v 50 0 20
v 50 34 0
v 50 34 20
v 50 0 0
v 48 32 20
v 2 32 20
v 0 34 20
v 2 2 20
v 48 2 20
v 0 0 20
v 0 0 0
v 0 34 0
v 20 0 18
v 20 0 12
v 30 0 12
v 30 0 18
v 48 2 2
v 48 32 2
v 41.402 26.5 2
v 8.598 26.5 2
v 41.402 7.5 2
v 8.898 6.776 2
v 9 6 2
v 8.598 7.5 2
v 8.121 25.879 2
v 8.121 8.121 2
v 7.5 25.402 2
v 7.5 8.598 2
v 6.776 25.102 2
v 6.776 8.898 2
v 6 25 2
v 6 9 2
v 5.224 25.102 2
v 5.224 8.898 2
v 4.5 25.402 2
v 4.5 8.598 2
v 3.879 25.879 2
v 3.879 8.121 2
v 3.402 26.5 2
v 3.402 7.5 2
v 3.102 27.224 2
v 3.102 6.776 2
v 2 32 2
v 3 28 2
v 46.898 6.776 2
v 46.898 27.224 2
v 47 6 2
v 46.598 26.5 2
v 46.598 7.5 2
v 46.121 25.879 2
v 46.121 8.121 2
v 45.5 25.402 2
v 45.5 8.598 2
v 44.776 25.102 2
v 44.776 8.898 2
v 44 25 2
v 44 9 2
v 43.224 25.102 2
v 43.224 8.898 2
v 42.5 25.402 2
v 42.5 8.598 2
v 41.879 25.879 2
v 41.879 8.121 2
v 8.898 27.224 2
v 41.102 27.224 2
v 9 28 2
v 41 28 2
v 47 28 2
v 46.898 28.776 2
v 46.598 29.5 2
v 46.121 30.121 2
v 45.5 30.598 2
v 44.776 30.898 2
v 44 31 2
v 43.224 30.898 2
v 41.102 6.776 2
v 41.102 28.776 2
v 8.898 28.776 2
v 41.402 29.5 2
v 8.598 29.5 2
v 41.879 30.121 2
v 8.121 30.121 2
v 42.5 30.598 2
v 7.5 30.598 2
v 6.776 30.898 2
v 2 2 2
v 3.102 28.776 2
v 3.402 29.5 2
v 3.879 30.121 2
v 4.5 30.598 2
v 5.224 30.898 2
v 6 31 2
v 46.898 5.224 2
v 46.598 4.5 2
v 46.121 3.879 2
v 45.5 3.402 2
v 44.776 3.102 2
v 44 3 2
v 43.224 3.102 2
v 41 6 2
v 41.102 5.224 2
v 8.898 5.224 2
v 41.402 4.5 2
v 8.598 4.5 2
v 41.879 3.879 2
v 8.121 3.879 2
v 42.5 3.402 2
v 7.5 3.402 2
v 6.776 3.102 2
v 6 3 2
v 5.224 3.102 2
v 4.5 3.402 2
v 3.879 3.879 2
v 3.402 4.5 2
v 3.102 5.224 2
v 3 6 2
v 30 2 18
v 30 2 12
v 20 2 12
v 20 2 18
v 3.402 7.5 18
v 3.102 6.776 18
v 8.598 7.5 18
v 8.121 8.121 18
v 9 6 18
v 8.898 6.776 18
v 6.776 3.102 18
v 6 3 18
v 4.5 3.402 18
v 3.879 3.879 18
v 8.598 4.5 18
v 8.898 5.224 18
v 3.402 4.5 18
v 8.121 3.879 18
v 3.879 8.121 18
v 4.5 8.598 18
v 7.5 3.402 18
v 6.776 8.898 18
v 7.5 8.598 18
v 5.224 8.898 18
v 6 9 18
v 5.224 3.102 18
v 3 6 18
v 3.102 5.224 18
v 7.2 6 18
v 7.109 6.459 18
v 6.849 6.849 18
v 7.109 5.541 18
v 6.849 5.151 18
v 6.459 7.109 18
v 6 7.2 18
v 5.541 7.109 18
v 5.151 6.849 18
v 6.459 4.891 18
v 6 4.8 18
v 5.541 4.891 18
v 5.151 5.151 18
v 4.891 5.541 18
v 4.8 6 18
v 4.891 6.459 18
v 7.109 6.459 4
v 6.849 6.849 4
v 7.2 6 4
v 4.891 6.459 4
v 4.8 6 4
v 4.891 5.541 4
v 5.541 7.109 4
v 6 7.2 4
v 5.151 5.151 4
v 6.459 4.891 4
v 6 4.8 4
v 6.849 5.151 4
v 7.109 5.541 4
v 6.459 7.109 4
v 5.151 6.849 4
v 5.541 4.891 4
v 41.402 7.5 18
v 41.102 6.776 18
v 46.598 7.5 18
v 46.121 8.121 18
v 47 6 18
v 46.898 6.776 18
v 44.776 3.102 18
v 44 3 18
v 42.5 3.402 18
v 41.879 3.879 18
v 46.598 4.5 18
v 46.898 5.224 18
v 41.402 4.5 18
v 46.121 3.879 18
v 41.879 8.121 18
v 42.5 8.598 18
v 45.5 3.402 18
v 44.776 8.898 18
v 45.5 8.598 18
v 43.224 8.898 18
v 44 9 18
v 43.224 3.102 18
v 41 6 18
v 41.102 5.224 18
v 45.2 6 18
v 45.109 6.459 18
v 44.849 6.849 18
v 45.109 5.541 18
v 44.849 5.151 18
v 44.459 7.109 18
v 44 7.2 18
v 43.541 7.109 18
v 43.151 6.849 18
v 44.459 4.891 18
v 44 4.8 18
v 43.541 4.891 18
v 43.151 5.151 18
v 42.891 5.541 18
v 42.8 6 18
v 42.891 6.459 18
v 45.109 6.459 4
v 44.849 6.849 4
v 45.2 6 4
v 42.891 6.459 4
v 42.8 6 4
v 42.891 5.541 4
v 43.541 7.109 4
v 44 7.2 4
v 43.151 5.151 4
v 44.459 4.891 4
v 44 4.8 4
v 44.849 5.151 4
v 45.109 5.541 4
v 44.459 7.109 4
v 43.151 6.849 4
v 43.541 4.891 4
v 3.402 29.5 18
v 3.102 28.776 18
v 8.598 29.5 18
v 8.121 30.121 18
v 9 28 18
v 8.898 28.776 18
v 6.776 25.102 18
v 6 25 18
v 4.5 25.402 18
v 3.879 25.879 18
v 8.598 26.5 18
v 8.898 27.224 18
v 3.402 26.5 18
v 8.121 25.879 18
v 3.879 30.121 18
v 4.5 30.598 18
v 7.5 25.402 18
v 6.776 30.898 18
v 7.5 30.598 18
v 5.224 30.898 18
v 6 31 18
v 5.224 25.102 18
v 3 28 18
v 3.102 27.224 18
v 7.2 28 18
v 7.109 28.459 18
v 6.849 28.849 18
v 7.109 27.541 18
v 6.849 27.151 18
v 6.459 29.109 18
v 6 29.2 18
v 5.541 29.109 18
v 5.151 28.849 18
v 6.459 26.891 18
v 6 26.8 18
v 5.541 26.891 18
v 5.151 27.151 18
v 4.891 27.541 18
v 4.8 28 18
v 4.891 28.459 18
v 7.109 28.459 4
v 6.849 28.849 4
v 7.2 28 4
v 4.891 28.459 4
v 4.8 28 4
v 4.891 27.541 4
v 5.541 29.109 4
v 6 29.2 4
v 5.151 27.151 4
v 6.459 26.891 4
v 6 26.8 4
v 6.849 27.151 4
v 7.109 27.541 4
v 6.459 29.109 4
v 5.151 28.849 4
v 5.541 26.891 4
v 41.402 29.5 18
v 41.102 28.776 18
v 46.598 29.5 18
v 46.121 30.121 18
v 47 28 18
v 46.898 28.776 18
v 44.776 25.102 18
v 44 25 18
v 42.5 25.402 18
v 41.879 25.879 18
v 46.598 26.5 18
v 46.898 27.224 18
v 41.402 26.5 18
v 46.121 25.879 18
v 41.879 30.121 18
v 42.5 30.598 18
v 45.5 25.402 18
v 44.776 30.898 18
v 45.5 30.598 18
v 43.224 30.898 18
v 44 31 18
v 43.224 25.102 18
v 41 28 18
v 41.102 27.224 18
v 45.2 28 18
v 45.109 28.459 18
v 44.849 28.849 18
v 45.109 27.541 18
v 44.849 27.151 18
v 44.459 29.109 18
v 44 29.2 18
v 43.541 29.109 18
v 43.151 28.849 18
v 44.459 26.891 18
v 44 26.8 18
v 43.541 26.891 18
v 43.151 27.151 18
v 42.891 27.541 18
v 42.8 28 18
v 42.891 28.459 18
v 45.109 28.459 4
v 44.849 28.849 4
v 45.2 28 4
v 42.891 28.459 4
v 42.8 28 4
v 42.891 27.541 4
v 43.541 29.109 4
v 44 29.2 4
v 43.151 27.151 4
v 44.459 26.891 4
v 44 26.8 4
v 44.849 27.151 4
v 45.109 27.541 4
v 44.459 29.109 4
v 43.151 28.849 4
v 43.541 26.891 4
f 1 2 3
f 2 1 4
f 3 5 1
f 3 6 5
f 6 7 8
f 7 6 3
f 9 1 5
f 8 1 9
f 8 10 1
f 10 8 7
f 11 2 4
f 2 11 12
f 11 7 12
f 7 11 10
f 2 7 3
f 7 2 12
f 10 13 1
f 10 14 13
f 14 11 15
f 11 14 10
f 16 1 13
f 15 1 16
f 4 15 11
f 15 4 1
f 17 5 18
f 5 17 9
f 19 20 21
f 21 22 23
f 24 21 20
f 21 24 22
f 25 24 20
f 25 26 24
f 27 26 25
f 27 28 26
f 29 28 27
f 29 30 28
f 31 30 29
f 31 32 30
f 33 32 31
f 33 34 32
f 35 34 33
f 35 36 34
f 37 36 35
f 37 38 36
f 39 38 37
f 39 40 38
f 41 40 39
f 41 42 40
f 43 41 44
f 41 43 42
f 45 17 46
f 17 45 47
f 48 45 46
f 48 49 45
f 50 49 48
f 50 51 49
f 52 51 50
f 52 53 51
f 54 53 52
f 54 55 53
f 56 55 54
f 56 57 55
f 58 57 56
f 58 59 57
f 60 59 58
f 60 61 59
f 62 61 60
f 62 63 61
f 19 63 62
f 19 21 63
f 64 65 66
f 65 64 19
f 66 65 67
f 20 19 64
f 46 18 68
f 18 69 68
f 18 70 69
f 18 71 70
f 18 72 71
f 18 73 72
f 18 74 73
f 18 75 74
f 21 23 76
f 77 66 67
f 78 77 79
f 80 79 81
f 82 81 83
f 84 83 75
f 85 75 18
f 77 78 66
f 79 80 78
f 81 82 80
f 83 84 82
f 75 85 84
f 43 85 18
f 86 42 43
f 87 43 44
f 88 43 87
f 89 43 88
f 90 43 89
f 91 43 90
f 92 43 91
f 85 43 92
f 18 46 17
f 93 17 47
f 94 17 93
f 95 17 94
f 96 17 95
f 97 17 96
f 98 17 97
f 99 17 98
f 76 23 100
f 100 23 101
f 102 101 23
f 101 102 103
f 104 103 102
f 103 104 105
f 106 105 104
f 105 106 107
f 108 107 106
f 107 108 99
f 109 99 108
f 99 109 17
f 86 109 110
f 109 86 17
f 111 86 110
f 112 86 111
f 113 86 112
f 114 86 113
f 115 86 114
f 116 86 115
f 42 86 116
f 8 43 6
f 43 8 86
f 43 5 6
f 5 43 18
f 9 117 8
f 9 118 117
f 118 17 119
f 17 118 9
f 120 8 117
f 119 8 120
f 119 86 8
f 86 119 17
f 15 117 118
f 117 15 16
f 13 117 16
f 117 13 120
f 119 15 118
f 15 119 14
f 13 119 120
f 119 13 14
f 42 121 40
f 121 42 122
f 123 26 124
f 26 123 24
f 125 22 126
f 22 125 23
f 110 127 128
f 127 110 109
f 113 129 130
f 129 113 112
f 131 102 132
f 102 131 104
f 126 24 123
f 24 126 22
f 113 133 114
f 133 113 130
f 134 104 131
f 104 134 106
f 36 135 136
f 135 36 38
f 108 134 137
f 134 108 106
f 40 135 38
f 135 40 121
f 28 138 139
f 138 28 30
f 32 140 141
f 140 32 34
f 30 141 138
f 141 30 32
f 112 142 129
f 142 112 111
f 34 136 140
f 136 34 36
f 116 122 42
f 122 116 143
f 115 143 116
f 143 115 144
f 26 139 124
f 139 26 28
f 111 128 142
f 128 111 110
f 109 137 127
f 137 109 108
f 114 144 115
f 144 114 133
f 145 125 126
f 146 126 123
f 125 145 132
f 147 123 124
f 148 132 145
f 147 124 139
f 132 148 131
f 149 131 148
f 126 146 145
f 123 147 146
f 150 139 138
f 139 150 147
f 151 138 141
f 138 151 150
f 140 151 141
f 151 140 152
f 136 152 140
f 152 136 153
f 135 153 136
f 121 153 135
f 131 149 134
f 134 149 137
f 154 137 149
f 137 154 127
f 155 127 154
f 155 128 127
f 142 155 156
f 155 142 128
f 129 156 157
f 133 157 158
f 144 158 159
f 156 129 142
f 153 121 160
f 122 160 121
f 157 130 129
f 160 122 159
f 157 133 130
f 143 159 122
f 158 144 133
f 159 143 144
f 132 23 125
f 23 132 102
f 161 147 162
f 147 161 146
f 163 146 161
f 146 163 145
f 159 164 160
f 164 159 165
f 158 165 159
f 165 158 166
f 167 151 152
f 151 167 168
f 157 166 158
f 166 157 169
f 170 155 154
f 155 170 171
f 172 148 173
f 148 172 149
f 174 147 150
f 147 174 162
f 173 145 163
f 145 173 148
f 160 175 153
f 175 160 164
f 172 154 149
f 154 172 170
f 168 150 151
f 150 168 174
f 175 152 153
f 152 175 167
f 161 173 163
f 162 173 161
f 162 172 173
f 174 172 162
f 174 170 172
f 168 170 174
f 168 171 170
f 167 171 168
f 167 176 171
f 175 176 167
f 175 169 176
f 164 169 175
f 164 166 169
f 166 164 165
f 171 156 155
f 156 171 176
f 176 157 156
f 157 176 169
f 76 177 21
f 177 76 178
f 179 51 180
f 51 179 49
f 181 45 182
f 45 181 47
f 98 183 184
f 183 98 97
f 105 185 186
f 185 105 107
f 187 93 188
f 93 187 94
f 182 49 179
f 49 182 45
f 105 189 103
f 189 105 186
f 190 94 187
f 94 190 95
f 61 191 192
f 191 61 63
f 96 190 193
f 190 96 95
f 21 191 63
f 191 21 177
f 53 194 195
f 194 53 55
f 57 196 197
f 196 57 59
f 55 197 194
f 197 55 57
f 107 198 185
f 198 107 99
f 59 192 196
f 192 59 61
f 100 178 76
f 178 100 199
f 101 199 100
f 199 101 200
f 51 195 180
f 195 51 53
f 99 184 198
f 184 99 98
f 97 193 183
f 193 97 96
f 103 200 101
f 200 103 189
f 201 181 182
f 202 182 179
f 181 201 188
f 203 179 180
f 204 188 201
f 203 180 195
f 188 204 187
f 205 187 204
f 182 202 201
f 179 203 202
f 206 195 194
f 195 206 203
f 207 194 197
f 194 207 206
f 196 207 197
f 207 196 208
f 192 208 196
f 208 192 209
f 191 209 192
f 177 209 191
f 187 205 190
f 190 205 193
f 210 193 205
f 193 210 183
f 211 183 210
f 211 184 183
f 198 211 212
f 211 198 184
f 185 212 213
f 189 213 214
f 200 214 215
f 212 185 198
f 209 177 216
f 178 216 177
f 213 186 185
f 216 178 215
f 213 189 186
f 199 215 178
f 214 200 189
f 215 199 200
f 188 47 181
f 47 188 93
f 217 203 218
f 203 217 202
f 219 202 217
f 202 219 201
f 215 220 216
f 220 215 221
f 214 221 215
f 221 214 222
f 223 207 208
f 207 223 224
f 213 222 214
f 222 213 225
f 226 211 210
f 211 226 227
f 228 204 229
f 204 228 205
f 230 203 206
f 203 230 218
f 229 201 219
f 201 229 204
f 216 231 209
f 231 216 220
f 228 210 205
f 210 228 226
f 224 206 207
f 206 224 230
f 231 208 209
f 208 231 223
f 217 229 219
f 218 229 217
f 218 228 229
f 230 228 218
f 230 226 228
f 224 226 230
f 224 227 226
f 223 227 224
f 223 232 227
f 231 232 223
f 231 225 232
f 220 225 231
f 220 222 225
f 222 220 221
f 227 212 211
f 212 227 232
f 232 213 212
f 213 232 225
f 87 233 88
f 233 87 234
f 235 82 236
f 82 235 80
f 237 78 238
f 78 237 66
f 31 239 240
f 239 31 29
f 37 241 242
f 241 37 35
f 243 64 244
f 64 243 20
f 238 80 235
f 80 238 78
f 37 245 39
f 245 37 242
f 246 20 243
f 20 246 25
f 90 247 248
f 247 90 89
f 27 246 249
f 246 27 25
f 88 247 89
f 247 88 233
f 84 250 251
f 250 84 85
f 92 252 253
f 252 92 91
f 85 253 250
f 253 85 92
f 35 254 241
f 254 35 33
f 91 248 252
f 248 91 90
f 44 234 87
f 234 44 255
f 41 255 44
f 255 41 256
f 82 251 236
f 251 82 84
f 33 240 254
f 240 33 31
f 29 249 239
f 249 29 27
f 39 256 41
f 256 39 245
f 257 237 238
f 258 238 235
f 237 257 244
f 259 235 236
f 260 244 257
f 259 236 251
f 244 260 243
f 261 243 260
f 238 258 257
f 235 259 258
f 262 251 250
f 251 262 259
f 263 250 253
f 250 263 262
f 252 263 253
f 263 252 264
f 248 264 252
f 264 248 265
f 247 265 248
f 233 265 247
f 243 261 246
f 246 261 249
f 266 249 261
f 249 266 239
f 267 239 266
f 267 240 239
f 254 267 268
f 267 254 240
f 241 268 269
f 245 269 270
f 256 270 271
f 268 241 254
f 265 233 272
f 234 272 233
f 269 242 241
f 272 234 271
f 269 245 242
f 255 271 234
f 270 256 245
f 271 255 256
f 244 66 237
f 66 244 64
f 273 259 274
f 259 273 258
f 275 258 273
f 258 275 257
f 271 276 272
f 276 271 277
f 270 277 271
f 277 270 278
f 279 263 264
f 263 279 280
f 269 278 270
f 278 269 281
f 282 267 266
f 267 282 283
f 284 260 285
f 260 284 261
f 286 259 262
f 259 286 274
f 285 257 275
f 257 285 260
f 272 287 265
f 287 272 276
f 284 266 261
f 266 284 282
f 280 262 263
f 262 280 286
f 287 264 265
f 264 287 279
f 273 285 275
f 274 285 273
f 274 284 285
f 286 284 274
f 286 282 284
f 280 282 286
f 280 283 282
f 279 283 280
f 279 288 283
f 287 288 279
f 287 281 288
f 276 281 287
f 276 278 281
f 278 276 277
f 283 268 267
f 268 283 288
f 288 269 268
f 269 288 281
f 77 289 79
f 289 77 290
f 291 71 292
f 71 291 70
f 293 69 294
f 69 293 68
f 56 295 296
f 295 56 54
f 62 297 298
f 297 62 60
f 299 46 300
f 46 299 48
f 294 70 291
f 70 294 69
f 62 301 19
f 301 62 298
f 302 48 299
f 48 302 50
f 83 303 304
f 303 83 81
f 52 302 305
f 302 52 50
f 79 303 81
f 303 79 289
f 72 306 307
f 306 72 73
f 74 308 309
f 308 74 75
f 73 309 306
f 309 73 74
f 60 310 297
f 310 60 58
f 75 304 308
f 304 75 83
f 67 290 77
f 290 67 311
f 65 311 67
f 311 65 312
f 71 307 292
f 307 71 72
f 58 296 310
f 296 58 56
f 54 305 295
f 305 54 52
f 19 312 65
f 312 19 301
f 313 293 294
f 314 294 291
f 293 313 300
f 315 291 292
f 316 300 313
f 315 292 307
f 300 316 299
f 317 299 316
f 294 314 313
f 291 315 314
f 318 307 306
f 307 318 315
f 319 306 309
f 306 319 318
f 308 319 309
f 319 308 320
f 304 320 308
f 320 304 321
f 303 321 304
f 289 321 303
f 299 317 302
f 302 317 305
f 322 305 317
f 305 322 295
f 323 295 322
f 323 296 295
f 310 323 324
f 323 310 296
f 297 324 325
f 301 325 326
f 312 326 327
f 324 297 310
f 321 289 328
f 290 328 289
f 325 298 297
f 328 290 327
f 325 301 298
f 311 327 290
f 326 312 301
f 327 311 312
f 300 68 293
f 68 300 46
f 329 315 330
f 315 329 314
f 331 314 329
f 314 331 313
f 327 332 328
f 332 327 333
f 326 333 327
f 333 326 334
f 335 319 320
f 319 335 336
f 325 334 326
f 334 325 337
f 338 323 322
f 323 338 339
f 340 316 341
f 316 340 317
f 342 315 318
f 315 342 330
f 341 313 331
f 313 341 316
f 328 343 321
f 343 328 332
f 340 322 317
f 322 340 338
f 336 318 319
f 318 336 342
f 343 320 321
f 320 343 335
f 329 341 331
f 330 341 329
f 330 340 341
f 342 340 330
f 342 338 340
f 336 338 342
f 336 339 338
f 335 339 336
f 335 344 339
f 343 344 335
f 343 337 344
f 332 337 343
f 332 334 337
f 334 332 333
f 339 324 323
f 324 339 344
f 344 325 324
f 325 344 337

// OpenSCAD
// Real part: a snap-box enclosure — an outer shell hollowed by an inner
// cavity (difference of shells) with a cable cutout and internal boss posts.
// Constructs: difference, union, for-loop, translate, cube, cylinder.
outer = [50, 34, 20];
wall = 2;

module shell() {
    difference() {
        cube(outer);
        // Hollow the inside, leaving a floor and four walls (open top).
        translate([wall, wall, wall])
            cube([outer[0] - 2 * wall, outer[1] - 2 * wall, outer[2]]);
        // Cable pass-through on the front wall.
        translate([outer[0] / 2 - 5, -1, outer[2] - 8])
            cube([10, wall + 2, 6]);
    }
}

module bosses() {
    for (c = [[6, 6], [outer[0] - 6, 6], [6, outer[1] - 6], [outer[0] - 6, outer[1] - 6]]) {
        translate([c[0], c[1], wall]) difference() {
            cylinder(h = outer[2] - wall - 2, r = 3, $fn = 24);
            translate([0, 0, 2]) cylinder(h = outer[2], r = 1.2, $fn = 16);
        }
    }
}

union() {
    shell();
    bosses();
}
